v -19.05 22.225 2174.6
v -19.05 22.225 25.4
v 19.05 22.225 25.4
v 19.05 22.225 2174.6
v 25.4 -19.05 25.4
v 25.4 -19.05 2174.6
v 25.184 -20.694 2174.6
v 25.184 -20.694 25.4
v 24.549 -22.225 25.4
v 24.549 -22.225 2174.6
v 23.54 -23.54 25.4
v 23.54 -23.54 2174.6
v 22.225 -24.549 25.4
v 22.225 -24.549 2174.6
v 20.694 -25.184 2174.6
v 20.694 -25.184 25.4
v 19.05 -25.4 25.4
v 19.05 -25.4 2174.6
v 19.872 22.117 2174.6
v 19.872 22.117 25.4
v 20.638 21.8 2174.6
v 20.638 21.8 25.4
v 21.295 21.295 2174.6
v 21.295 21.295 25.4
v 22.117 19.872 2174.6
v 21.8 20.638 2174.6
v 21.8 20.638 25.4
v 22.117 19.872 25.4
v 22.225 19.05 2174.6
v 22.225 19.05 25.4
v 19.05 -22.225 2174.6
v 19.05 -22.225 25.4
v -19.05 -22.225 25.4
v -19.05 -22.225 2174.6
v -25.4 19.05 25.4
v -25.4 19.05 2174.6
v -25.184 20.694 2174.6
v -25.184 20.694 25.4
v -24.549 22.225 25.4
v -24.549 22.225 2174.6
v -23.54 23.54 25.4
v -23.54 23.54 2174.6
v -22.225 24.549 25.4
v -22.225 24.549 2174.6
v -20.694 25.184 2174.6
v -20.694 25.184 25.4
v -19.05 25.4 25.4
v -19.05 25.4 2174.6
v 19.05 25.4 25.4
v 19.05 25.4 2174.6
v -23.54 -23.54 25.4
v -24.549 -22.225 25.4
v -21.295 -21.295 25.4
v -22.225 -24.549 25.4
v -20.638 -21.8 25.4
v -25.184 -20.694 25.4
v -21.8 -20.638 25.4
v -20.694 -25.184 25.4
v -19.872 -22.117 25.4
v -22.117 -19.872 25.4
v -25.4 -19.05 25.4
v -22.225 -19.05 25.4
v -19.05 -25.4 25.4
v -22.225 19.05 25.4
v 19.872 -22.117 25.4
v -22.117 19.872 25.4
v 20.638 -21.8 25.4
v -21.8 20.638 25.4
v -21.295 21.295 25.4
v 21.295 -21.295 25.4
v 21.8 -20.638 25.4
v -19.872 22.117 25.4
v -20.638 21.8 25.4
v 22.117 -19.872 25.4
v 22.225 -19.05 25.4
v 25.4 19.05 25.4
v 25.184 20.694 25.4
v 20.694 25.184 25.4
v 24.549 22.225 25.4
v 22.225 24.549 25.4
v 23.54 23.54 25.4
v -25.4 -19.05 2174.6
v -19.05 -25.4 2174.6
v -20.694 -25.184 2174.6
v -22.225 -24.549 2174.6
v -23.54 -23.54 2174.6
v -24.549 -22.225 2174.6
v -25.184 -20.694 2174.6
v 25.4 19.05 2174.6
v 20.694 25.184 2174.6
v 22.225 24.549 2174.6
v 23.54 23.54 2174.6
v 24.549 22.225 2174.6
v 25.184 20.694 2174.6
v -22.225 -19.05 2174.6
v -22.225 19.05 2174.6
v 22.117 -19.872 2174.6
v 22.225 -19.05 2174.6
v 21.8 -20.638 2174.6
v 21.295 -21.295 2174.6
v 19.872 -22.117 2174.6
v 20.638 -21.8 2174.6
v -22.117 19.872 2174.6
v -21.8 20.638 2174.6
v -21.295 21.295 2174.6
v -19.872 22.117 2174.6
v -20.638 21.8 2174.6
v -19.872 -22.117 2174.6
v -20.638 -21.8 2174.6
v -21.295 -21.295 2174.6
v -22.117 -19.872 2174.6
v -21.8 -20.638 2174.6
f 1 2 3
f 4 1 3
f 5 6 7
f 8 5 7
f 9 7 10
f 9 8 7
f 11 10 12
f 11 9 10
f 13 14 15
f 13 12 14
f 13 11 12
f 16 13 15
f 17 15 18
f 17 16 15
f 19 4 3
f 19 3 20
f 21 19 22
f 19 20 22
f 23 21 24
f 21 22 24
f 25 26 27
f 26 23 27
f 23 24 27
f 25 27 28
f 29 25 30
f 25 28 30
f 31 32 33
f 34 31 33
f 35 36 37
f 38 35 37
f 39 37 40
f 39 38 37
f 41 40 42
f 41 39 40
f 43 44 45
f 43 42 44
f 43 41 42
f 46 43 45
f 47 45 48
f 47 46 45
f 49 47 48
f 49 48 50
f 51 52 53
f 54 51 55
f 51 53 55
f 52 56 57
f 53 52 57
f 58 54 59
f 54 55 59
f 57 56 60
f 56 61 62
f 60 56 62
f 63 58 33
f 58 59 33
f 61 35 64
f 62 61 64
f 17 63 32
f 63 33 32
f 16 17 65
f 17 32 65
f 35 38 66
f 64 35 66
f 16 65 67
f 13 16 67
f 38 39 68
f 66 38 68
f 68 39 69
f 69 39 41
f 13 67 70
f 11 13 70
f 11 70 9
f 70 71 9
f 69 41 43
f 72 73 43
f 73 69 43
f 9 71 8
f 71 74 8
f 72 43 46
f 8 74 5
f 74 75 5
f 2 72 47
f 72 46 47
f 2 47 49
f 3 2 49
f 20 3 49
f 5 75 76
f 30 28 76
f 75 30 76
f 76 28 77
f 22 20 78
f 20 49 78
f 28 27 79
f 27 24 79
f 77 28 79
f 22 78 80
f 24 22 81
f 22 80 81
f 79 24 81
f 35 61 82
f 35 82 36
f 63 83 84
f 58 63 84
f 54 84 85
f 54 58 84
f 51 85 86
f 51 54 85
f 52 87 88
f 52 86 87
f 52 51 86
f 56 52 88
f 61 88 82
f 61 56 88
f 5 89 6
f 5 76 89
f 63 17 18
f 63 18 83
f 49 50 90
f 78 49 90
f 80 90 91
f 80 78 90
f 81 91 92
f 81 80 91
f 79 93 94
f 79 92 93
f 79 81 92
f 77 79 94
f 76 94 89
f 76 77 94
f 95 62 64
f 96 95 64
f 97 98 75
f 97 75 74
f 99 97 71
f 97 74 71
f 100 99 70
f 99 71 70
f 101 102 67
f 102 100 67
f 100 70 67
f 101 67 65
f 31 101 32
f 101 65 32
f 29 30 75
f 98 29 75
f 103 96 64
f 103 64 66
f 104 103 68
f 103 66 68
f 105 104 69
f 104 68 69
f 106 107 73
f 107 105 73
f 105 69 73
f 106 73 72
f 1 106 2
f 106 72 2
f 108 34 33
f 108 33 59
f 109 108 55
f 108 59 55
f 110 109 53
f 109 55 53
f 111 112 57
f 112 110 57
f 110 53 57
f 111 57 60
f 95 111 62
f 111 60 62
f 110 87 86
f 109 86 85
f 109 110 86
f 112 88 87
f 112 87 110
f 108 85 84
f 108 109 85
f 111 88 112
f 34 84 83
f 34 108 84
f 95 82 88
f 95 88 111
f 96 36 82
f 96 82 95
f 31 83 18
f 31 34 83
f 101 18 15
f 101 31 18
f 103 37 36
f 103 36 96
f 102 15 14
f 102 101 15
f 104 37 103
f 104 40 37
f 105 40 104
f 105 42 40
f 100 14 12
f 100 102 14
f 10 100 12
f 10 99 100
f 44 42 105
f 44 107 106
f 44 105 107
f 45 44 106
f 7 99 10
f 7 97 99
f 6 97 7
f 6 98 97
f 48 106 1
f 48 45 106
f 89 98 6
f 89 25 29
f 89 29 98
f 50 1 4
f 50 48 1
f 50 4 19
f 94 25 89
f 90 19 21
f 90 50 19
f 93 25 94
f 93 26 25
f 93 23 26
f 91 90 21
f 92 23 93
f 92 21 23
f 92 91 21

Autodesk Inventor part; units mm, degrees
ref_plane "Plano inicial" through (0, 0, 25.4) normal (0, 0, 1) x (1, 0, 0)
ref_plane "Plano final" through (0, 0, 2174.6) normal (0, 0, 1) x (1, 0, 0)
sketch "Boceto" plane through (0, 0, 0) normal (0, 0, 1) x (1, 0, 0)
  line L0 (-25.4, -19.05) -> (-25.4, 19.05)
  line L1 (-19.05, 25.4) -> (19.05, 25.4)
  line L2 (25.4, 19.05) -> (25.4, -19.05)
  line L3 (19.05, -25.4) -> (-19.05, -25.4)
  arc A0 (-25.4, -19.05) -> (-19.05, -25.4) centre (-19.05, -19.05) ccw
  arc A1 (-19.05, 25.4) -> (-25.4, 19.05) centre (-19.05, 19.05) ccw
  arc A2 (25.4, 19.05) -> (19.05, 25.4) centre (19.05, 19.05) ccw
  arc A3 (19.05, -25.4) -> (25.4, -19.05) centre (19.05, -19.05) ccw
  arc A4 (-19.05, 22.225) -> (-22.225, 19.05) centre (-19.05, 19.05) ccw
  line L4 (-19.05, 22.225) -> (19.05, 22.225)
  arc A5 (22.225, 19.05) -> (19.05, 22.225) centre (19.05, 19.05) ccw
  line L5 (22.225, 19.05) -> (22.225, -19.05)
  arc A6 (19.05, -22.225) -> (22.225, -19.05) centre (19.05, -19.05) ccw
  line L6 (19.05, -22.225) -> (-19.05, -22.225)
  arc A7 (-22.225, -19.05) -> (-19.05, -22.225) centre (-19.05, -19.05) ccw
  line L7 (-22.225, -19.05) -> (-22.225, 19.05)
  line L8 (0, 37.4012) -> (0, -37.4012) construction
  line L9 (-37.4012, 0) -> (37.4012, 0) construction
  dimension "d10" = 50.8
  dimension "d11" = 50.8
  dimension "d12" = 3.175
  dimension "d15" = 25.4
  dimension "d16" = 25.4
  dimension "d17" = 6.35
extrude "Cuerpo" add sketch "Boceto" along normal up to surface (2149.2 mm away) from surface at 25.4
sketch "Sketch3" plane through (0, 0, 0) normal (0, 0, 1) x (1, 0, 0)
  line L0 (0, 0) -> (10, 0)
ref_plane "Work Plane3" through (0, 0, 0) normal (0, -1, 0) x (1, 0, 0)
ref_plane "Plano de trabajo4" through (-2980.95, 0, 2174.6) normal (0, 0, 1) x (1, 0, 0)
split "Dividir1" plane through (-2980.95, 0, 2174.6) removes the side toward (0, 0, 1)
ref_plane "Plano de trabajo5" through (-3000, -19.05, 25.4) normal (0, 0, -1) x (-1, 0, 0)
split "Dividir2" plane through (-3000, -19.05, 25.4) removes the side toward (0, 0, -1)
ref_plane "Plano de trabajo6" through (-2980.95, -2890, 25.4) normal (0, 0, -1) x (-1, 0, 0)
split "Dividir3" plane through (-2980.95, -2890, 25.4) removes the side toward (0, 0, -1)
sketch "Sketch4" plane through (0, 0, 0) normal (0, -1, 0) x (1, 0, 0)
  line L0 (-2, 25.4) -> (12, 25.4) projected
  line L1 (-2, 2174.6) -> (12, 2174.6) projected
  dimension "d19" = 2149.2
equation "\"d10\" = G_H"
equation "\"d11\" = G_W"
equation "\"d12\" = G_T"
equation "\"d15\" = 0.5 * d10"
equation "\"d16\" = 0.5 * d11"
equation "\"d17\" = G_IR"
equation "\"d3\" = G_L"
equation "\"G_W\" = 50.8"
equation "\"G_H\" = 50.8"
equation "\"G_T\" = 3.175"
equation "\"G_IR\" = 6.35"
equation "\"G_L\" = d19"
equation "\"G_OFFSET_START\" = -25.4"
equation "\"G_OFFSET_END\" = -25.4"
equation "\"d13\" = -G_OFFSET_START"
equation "\"d14\" = G_OFFSET_END + B_L"
equation "\"B_L\" = 2200"
properties part number "AISC - 2 x 2 x 1/8 - 84,614" material "Acero, suave"
